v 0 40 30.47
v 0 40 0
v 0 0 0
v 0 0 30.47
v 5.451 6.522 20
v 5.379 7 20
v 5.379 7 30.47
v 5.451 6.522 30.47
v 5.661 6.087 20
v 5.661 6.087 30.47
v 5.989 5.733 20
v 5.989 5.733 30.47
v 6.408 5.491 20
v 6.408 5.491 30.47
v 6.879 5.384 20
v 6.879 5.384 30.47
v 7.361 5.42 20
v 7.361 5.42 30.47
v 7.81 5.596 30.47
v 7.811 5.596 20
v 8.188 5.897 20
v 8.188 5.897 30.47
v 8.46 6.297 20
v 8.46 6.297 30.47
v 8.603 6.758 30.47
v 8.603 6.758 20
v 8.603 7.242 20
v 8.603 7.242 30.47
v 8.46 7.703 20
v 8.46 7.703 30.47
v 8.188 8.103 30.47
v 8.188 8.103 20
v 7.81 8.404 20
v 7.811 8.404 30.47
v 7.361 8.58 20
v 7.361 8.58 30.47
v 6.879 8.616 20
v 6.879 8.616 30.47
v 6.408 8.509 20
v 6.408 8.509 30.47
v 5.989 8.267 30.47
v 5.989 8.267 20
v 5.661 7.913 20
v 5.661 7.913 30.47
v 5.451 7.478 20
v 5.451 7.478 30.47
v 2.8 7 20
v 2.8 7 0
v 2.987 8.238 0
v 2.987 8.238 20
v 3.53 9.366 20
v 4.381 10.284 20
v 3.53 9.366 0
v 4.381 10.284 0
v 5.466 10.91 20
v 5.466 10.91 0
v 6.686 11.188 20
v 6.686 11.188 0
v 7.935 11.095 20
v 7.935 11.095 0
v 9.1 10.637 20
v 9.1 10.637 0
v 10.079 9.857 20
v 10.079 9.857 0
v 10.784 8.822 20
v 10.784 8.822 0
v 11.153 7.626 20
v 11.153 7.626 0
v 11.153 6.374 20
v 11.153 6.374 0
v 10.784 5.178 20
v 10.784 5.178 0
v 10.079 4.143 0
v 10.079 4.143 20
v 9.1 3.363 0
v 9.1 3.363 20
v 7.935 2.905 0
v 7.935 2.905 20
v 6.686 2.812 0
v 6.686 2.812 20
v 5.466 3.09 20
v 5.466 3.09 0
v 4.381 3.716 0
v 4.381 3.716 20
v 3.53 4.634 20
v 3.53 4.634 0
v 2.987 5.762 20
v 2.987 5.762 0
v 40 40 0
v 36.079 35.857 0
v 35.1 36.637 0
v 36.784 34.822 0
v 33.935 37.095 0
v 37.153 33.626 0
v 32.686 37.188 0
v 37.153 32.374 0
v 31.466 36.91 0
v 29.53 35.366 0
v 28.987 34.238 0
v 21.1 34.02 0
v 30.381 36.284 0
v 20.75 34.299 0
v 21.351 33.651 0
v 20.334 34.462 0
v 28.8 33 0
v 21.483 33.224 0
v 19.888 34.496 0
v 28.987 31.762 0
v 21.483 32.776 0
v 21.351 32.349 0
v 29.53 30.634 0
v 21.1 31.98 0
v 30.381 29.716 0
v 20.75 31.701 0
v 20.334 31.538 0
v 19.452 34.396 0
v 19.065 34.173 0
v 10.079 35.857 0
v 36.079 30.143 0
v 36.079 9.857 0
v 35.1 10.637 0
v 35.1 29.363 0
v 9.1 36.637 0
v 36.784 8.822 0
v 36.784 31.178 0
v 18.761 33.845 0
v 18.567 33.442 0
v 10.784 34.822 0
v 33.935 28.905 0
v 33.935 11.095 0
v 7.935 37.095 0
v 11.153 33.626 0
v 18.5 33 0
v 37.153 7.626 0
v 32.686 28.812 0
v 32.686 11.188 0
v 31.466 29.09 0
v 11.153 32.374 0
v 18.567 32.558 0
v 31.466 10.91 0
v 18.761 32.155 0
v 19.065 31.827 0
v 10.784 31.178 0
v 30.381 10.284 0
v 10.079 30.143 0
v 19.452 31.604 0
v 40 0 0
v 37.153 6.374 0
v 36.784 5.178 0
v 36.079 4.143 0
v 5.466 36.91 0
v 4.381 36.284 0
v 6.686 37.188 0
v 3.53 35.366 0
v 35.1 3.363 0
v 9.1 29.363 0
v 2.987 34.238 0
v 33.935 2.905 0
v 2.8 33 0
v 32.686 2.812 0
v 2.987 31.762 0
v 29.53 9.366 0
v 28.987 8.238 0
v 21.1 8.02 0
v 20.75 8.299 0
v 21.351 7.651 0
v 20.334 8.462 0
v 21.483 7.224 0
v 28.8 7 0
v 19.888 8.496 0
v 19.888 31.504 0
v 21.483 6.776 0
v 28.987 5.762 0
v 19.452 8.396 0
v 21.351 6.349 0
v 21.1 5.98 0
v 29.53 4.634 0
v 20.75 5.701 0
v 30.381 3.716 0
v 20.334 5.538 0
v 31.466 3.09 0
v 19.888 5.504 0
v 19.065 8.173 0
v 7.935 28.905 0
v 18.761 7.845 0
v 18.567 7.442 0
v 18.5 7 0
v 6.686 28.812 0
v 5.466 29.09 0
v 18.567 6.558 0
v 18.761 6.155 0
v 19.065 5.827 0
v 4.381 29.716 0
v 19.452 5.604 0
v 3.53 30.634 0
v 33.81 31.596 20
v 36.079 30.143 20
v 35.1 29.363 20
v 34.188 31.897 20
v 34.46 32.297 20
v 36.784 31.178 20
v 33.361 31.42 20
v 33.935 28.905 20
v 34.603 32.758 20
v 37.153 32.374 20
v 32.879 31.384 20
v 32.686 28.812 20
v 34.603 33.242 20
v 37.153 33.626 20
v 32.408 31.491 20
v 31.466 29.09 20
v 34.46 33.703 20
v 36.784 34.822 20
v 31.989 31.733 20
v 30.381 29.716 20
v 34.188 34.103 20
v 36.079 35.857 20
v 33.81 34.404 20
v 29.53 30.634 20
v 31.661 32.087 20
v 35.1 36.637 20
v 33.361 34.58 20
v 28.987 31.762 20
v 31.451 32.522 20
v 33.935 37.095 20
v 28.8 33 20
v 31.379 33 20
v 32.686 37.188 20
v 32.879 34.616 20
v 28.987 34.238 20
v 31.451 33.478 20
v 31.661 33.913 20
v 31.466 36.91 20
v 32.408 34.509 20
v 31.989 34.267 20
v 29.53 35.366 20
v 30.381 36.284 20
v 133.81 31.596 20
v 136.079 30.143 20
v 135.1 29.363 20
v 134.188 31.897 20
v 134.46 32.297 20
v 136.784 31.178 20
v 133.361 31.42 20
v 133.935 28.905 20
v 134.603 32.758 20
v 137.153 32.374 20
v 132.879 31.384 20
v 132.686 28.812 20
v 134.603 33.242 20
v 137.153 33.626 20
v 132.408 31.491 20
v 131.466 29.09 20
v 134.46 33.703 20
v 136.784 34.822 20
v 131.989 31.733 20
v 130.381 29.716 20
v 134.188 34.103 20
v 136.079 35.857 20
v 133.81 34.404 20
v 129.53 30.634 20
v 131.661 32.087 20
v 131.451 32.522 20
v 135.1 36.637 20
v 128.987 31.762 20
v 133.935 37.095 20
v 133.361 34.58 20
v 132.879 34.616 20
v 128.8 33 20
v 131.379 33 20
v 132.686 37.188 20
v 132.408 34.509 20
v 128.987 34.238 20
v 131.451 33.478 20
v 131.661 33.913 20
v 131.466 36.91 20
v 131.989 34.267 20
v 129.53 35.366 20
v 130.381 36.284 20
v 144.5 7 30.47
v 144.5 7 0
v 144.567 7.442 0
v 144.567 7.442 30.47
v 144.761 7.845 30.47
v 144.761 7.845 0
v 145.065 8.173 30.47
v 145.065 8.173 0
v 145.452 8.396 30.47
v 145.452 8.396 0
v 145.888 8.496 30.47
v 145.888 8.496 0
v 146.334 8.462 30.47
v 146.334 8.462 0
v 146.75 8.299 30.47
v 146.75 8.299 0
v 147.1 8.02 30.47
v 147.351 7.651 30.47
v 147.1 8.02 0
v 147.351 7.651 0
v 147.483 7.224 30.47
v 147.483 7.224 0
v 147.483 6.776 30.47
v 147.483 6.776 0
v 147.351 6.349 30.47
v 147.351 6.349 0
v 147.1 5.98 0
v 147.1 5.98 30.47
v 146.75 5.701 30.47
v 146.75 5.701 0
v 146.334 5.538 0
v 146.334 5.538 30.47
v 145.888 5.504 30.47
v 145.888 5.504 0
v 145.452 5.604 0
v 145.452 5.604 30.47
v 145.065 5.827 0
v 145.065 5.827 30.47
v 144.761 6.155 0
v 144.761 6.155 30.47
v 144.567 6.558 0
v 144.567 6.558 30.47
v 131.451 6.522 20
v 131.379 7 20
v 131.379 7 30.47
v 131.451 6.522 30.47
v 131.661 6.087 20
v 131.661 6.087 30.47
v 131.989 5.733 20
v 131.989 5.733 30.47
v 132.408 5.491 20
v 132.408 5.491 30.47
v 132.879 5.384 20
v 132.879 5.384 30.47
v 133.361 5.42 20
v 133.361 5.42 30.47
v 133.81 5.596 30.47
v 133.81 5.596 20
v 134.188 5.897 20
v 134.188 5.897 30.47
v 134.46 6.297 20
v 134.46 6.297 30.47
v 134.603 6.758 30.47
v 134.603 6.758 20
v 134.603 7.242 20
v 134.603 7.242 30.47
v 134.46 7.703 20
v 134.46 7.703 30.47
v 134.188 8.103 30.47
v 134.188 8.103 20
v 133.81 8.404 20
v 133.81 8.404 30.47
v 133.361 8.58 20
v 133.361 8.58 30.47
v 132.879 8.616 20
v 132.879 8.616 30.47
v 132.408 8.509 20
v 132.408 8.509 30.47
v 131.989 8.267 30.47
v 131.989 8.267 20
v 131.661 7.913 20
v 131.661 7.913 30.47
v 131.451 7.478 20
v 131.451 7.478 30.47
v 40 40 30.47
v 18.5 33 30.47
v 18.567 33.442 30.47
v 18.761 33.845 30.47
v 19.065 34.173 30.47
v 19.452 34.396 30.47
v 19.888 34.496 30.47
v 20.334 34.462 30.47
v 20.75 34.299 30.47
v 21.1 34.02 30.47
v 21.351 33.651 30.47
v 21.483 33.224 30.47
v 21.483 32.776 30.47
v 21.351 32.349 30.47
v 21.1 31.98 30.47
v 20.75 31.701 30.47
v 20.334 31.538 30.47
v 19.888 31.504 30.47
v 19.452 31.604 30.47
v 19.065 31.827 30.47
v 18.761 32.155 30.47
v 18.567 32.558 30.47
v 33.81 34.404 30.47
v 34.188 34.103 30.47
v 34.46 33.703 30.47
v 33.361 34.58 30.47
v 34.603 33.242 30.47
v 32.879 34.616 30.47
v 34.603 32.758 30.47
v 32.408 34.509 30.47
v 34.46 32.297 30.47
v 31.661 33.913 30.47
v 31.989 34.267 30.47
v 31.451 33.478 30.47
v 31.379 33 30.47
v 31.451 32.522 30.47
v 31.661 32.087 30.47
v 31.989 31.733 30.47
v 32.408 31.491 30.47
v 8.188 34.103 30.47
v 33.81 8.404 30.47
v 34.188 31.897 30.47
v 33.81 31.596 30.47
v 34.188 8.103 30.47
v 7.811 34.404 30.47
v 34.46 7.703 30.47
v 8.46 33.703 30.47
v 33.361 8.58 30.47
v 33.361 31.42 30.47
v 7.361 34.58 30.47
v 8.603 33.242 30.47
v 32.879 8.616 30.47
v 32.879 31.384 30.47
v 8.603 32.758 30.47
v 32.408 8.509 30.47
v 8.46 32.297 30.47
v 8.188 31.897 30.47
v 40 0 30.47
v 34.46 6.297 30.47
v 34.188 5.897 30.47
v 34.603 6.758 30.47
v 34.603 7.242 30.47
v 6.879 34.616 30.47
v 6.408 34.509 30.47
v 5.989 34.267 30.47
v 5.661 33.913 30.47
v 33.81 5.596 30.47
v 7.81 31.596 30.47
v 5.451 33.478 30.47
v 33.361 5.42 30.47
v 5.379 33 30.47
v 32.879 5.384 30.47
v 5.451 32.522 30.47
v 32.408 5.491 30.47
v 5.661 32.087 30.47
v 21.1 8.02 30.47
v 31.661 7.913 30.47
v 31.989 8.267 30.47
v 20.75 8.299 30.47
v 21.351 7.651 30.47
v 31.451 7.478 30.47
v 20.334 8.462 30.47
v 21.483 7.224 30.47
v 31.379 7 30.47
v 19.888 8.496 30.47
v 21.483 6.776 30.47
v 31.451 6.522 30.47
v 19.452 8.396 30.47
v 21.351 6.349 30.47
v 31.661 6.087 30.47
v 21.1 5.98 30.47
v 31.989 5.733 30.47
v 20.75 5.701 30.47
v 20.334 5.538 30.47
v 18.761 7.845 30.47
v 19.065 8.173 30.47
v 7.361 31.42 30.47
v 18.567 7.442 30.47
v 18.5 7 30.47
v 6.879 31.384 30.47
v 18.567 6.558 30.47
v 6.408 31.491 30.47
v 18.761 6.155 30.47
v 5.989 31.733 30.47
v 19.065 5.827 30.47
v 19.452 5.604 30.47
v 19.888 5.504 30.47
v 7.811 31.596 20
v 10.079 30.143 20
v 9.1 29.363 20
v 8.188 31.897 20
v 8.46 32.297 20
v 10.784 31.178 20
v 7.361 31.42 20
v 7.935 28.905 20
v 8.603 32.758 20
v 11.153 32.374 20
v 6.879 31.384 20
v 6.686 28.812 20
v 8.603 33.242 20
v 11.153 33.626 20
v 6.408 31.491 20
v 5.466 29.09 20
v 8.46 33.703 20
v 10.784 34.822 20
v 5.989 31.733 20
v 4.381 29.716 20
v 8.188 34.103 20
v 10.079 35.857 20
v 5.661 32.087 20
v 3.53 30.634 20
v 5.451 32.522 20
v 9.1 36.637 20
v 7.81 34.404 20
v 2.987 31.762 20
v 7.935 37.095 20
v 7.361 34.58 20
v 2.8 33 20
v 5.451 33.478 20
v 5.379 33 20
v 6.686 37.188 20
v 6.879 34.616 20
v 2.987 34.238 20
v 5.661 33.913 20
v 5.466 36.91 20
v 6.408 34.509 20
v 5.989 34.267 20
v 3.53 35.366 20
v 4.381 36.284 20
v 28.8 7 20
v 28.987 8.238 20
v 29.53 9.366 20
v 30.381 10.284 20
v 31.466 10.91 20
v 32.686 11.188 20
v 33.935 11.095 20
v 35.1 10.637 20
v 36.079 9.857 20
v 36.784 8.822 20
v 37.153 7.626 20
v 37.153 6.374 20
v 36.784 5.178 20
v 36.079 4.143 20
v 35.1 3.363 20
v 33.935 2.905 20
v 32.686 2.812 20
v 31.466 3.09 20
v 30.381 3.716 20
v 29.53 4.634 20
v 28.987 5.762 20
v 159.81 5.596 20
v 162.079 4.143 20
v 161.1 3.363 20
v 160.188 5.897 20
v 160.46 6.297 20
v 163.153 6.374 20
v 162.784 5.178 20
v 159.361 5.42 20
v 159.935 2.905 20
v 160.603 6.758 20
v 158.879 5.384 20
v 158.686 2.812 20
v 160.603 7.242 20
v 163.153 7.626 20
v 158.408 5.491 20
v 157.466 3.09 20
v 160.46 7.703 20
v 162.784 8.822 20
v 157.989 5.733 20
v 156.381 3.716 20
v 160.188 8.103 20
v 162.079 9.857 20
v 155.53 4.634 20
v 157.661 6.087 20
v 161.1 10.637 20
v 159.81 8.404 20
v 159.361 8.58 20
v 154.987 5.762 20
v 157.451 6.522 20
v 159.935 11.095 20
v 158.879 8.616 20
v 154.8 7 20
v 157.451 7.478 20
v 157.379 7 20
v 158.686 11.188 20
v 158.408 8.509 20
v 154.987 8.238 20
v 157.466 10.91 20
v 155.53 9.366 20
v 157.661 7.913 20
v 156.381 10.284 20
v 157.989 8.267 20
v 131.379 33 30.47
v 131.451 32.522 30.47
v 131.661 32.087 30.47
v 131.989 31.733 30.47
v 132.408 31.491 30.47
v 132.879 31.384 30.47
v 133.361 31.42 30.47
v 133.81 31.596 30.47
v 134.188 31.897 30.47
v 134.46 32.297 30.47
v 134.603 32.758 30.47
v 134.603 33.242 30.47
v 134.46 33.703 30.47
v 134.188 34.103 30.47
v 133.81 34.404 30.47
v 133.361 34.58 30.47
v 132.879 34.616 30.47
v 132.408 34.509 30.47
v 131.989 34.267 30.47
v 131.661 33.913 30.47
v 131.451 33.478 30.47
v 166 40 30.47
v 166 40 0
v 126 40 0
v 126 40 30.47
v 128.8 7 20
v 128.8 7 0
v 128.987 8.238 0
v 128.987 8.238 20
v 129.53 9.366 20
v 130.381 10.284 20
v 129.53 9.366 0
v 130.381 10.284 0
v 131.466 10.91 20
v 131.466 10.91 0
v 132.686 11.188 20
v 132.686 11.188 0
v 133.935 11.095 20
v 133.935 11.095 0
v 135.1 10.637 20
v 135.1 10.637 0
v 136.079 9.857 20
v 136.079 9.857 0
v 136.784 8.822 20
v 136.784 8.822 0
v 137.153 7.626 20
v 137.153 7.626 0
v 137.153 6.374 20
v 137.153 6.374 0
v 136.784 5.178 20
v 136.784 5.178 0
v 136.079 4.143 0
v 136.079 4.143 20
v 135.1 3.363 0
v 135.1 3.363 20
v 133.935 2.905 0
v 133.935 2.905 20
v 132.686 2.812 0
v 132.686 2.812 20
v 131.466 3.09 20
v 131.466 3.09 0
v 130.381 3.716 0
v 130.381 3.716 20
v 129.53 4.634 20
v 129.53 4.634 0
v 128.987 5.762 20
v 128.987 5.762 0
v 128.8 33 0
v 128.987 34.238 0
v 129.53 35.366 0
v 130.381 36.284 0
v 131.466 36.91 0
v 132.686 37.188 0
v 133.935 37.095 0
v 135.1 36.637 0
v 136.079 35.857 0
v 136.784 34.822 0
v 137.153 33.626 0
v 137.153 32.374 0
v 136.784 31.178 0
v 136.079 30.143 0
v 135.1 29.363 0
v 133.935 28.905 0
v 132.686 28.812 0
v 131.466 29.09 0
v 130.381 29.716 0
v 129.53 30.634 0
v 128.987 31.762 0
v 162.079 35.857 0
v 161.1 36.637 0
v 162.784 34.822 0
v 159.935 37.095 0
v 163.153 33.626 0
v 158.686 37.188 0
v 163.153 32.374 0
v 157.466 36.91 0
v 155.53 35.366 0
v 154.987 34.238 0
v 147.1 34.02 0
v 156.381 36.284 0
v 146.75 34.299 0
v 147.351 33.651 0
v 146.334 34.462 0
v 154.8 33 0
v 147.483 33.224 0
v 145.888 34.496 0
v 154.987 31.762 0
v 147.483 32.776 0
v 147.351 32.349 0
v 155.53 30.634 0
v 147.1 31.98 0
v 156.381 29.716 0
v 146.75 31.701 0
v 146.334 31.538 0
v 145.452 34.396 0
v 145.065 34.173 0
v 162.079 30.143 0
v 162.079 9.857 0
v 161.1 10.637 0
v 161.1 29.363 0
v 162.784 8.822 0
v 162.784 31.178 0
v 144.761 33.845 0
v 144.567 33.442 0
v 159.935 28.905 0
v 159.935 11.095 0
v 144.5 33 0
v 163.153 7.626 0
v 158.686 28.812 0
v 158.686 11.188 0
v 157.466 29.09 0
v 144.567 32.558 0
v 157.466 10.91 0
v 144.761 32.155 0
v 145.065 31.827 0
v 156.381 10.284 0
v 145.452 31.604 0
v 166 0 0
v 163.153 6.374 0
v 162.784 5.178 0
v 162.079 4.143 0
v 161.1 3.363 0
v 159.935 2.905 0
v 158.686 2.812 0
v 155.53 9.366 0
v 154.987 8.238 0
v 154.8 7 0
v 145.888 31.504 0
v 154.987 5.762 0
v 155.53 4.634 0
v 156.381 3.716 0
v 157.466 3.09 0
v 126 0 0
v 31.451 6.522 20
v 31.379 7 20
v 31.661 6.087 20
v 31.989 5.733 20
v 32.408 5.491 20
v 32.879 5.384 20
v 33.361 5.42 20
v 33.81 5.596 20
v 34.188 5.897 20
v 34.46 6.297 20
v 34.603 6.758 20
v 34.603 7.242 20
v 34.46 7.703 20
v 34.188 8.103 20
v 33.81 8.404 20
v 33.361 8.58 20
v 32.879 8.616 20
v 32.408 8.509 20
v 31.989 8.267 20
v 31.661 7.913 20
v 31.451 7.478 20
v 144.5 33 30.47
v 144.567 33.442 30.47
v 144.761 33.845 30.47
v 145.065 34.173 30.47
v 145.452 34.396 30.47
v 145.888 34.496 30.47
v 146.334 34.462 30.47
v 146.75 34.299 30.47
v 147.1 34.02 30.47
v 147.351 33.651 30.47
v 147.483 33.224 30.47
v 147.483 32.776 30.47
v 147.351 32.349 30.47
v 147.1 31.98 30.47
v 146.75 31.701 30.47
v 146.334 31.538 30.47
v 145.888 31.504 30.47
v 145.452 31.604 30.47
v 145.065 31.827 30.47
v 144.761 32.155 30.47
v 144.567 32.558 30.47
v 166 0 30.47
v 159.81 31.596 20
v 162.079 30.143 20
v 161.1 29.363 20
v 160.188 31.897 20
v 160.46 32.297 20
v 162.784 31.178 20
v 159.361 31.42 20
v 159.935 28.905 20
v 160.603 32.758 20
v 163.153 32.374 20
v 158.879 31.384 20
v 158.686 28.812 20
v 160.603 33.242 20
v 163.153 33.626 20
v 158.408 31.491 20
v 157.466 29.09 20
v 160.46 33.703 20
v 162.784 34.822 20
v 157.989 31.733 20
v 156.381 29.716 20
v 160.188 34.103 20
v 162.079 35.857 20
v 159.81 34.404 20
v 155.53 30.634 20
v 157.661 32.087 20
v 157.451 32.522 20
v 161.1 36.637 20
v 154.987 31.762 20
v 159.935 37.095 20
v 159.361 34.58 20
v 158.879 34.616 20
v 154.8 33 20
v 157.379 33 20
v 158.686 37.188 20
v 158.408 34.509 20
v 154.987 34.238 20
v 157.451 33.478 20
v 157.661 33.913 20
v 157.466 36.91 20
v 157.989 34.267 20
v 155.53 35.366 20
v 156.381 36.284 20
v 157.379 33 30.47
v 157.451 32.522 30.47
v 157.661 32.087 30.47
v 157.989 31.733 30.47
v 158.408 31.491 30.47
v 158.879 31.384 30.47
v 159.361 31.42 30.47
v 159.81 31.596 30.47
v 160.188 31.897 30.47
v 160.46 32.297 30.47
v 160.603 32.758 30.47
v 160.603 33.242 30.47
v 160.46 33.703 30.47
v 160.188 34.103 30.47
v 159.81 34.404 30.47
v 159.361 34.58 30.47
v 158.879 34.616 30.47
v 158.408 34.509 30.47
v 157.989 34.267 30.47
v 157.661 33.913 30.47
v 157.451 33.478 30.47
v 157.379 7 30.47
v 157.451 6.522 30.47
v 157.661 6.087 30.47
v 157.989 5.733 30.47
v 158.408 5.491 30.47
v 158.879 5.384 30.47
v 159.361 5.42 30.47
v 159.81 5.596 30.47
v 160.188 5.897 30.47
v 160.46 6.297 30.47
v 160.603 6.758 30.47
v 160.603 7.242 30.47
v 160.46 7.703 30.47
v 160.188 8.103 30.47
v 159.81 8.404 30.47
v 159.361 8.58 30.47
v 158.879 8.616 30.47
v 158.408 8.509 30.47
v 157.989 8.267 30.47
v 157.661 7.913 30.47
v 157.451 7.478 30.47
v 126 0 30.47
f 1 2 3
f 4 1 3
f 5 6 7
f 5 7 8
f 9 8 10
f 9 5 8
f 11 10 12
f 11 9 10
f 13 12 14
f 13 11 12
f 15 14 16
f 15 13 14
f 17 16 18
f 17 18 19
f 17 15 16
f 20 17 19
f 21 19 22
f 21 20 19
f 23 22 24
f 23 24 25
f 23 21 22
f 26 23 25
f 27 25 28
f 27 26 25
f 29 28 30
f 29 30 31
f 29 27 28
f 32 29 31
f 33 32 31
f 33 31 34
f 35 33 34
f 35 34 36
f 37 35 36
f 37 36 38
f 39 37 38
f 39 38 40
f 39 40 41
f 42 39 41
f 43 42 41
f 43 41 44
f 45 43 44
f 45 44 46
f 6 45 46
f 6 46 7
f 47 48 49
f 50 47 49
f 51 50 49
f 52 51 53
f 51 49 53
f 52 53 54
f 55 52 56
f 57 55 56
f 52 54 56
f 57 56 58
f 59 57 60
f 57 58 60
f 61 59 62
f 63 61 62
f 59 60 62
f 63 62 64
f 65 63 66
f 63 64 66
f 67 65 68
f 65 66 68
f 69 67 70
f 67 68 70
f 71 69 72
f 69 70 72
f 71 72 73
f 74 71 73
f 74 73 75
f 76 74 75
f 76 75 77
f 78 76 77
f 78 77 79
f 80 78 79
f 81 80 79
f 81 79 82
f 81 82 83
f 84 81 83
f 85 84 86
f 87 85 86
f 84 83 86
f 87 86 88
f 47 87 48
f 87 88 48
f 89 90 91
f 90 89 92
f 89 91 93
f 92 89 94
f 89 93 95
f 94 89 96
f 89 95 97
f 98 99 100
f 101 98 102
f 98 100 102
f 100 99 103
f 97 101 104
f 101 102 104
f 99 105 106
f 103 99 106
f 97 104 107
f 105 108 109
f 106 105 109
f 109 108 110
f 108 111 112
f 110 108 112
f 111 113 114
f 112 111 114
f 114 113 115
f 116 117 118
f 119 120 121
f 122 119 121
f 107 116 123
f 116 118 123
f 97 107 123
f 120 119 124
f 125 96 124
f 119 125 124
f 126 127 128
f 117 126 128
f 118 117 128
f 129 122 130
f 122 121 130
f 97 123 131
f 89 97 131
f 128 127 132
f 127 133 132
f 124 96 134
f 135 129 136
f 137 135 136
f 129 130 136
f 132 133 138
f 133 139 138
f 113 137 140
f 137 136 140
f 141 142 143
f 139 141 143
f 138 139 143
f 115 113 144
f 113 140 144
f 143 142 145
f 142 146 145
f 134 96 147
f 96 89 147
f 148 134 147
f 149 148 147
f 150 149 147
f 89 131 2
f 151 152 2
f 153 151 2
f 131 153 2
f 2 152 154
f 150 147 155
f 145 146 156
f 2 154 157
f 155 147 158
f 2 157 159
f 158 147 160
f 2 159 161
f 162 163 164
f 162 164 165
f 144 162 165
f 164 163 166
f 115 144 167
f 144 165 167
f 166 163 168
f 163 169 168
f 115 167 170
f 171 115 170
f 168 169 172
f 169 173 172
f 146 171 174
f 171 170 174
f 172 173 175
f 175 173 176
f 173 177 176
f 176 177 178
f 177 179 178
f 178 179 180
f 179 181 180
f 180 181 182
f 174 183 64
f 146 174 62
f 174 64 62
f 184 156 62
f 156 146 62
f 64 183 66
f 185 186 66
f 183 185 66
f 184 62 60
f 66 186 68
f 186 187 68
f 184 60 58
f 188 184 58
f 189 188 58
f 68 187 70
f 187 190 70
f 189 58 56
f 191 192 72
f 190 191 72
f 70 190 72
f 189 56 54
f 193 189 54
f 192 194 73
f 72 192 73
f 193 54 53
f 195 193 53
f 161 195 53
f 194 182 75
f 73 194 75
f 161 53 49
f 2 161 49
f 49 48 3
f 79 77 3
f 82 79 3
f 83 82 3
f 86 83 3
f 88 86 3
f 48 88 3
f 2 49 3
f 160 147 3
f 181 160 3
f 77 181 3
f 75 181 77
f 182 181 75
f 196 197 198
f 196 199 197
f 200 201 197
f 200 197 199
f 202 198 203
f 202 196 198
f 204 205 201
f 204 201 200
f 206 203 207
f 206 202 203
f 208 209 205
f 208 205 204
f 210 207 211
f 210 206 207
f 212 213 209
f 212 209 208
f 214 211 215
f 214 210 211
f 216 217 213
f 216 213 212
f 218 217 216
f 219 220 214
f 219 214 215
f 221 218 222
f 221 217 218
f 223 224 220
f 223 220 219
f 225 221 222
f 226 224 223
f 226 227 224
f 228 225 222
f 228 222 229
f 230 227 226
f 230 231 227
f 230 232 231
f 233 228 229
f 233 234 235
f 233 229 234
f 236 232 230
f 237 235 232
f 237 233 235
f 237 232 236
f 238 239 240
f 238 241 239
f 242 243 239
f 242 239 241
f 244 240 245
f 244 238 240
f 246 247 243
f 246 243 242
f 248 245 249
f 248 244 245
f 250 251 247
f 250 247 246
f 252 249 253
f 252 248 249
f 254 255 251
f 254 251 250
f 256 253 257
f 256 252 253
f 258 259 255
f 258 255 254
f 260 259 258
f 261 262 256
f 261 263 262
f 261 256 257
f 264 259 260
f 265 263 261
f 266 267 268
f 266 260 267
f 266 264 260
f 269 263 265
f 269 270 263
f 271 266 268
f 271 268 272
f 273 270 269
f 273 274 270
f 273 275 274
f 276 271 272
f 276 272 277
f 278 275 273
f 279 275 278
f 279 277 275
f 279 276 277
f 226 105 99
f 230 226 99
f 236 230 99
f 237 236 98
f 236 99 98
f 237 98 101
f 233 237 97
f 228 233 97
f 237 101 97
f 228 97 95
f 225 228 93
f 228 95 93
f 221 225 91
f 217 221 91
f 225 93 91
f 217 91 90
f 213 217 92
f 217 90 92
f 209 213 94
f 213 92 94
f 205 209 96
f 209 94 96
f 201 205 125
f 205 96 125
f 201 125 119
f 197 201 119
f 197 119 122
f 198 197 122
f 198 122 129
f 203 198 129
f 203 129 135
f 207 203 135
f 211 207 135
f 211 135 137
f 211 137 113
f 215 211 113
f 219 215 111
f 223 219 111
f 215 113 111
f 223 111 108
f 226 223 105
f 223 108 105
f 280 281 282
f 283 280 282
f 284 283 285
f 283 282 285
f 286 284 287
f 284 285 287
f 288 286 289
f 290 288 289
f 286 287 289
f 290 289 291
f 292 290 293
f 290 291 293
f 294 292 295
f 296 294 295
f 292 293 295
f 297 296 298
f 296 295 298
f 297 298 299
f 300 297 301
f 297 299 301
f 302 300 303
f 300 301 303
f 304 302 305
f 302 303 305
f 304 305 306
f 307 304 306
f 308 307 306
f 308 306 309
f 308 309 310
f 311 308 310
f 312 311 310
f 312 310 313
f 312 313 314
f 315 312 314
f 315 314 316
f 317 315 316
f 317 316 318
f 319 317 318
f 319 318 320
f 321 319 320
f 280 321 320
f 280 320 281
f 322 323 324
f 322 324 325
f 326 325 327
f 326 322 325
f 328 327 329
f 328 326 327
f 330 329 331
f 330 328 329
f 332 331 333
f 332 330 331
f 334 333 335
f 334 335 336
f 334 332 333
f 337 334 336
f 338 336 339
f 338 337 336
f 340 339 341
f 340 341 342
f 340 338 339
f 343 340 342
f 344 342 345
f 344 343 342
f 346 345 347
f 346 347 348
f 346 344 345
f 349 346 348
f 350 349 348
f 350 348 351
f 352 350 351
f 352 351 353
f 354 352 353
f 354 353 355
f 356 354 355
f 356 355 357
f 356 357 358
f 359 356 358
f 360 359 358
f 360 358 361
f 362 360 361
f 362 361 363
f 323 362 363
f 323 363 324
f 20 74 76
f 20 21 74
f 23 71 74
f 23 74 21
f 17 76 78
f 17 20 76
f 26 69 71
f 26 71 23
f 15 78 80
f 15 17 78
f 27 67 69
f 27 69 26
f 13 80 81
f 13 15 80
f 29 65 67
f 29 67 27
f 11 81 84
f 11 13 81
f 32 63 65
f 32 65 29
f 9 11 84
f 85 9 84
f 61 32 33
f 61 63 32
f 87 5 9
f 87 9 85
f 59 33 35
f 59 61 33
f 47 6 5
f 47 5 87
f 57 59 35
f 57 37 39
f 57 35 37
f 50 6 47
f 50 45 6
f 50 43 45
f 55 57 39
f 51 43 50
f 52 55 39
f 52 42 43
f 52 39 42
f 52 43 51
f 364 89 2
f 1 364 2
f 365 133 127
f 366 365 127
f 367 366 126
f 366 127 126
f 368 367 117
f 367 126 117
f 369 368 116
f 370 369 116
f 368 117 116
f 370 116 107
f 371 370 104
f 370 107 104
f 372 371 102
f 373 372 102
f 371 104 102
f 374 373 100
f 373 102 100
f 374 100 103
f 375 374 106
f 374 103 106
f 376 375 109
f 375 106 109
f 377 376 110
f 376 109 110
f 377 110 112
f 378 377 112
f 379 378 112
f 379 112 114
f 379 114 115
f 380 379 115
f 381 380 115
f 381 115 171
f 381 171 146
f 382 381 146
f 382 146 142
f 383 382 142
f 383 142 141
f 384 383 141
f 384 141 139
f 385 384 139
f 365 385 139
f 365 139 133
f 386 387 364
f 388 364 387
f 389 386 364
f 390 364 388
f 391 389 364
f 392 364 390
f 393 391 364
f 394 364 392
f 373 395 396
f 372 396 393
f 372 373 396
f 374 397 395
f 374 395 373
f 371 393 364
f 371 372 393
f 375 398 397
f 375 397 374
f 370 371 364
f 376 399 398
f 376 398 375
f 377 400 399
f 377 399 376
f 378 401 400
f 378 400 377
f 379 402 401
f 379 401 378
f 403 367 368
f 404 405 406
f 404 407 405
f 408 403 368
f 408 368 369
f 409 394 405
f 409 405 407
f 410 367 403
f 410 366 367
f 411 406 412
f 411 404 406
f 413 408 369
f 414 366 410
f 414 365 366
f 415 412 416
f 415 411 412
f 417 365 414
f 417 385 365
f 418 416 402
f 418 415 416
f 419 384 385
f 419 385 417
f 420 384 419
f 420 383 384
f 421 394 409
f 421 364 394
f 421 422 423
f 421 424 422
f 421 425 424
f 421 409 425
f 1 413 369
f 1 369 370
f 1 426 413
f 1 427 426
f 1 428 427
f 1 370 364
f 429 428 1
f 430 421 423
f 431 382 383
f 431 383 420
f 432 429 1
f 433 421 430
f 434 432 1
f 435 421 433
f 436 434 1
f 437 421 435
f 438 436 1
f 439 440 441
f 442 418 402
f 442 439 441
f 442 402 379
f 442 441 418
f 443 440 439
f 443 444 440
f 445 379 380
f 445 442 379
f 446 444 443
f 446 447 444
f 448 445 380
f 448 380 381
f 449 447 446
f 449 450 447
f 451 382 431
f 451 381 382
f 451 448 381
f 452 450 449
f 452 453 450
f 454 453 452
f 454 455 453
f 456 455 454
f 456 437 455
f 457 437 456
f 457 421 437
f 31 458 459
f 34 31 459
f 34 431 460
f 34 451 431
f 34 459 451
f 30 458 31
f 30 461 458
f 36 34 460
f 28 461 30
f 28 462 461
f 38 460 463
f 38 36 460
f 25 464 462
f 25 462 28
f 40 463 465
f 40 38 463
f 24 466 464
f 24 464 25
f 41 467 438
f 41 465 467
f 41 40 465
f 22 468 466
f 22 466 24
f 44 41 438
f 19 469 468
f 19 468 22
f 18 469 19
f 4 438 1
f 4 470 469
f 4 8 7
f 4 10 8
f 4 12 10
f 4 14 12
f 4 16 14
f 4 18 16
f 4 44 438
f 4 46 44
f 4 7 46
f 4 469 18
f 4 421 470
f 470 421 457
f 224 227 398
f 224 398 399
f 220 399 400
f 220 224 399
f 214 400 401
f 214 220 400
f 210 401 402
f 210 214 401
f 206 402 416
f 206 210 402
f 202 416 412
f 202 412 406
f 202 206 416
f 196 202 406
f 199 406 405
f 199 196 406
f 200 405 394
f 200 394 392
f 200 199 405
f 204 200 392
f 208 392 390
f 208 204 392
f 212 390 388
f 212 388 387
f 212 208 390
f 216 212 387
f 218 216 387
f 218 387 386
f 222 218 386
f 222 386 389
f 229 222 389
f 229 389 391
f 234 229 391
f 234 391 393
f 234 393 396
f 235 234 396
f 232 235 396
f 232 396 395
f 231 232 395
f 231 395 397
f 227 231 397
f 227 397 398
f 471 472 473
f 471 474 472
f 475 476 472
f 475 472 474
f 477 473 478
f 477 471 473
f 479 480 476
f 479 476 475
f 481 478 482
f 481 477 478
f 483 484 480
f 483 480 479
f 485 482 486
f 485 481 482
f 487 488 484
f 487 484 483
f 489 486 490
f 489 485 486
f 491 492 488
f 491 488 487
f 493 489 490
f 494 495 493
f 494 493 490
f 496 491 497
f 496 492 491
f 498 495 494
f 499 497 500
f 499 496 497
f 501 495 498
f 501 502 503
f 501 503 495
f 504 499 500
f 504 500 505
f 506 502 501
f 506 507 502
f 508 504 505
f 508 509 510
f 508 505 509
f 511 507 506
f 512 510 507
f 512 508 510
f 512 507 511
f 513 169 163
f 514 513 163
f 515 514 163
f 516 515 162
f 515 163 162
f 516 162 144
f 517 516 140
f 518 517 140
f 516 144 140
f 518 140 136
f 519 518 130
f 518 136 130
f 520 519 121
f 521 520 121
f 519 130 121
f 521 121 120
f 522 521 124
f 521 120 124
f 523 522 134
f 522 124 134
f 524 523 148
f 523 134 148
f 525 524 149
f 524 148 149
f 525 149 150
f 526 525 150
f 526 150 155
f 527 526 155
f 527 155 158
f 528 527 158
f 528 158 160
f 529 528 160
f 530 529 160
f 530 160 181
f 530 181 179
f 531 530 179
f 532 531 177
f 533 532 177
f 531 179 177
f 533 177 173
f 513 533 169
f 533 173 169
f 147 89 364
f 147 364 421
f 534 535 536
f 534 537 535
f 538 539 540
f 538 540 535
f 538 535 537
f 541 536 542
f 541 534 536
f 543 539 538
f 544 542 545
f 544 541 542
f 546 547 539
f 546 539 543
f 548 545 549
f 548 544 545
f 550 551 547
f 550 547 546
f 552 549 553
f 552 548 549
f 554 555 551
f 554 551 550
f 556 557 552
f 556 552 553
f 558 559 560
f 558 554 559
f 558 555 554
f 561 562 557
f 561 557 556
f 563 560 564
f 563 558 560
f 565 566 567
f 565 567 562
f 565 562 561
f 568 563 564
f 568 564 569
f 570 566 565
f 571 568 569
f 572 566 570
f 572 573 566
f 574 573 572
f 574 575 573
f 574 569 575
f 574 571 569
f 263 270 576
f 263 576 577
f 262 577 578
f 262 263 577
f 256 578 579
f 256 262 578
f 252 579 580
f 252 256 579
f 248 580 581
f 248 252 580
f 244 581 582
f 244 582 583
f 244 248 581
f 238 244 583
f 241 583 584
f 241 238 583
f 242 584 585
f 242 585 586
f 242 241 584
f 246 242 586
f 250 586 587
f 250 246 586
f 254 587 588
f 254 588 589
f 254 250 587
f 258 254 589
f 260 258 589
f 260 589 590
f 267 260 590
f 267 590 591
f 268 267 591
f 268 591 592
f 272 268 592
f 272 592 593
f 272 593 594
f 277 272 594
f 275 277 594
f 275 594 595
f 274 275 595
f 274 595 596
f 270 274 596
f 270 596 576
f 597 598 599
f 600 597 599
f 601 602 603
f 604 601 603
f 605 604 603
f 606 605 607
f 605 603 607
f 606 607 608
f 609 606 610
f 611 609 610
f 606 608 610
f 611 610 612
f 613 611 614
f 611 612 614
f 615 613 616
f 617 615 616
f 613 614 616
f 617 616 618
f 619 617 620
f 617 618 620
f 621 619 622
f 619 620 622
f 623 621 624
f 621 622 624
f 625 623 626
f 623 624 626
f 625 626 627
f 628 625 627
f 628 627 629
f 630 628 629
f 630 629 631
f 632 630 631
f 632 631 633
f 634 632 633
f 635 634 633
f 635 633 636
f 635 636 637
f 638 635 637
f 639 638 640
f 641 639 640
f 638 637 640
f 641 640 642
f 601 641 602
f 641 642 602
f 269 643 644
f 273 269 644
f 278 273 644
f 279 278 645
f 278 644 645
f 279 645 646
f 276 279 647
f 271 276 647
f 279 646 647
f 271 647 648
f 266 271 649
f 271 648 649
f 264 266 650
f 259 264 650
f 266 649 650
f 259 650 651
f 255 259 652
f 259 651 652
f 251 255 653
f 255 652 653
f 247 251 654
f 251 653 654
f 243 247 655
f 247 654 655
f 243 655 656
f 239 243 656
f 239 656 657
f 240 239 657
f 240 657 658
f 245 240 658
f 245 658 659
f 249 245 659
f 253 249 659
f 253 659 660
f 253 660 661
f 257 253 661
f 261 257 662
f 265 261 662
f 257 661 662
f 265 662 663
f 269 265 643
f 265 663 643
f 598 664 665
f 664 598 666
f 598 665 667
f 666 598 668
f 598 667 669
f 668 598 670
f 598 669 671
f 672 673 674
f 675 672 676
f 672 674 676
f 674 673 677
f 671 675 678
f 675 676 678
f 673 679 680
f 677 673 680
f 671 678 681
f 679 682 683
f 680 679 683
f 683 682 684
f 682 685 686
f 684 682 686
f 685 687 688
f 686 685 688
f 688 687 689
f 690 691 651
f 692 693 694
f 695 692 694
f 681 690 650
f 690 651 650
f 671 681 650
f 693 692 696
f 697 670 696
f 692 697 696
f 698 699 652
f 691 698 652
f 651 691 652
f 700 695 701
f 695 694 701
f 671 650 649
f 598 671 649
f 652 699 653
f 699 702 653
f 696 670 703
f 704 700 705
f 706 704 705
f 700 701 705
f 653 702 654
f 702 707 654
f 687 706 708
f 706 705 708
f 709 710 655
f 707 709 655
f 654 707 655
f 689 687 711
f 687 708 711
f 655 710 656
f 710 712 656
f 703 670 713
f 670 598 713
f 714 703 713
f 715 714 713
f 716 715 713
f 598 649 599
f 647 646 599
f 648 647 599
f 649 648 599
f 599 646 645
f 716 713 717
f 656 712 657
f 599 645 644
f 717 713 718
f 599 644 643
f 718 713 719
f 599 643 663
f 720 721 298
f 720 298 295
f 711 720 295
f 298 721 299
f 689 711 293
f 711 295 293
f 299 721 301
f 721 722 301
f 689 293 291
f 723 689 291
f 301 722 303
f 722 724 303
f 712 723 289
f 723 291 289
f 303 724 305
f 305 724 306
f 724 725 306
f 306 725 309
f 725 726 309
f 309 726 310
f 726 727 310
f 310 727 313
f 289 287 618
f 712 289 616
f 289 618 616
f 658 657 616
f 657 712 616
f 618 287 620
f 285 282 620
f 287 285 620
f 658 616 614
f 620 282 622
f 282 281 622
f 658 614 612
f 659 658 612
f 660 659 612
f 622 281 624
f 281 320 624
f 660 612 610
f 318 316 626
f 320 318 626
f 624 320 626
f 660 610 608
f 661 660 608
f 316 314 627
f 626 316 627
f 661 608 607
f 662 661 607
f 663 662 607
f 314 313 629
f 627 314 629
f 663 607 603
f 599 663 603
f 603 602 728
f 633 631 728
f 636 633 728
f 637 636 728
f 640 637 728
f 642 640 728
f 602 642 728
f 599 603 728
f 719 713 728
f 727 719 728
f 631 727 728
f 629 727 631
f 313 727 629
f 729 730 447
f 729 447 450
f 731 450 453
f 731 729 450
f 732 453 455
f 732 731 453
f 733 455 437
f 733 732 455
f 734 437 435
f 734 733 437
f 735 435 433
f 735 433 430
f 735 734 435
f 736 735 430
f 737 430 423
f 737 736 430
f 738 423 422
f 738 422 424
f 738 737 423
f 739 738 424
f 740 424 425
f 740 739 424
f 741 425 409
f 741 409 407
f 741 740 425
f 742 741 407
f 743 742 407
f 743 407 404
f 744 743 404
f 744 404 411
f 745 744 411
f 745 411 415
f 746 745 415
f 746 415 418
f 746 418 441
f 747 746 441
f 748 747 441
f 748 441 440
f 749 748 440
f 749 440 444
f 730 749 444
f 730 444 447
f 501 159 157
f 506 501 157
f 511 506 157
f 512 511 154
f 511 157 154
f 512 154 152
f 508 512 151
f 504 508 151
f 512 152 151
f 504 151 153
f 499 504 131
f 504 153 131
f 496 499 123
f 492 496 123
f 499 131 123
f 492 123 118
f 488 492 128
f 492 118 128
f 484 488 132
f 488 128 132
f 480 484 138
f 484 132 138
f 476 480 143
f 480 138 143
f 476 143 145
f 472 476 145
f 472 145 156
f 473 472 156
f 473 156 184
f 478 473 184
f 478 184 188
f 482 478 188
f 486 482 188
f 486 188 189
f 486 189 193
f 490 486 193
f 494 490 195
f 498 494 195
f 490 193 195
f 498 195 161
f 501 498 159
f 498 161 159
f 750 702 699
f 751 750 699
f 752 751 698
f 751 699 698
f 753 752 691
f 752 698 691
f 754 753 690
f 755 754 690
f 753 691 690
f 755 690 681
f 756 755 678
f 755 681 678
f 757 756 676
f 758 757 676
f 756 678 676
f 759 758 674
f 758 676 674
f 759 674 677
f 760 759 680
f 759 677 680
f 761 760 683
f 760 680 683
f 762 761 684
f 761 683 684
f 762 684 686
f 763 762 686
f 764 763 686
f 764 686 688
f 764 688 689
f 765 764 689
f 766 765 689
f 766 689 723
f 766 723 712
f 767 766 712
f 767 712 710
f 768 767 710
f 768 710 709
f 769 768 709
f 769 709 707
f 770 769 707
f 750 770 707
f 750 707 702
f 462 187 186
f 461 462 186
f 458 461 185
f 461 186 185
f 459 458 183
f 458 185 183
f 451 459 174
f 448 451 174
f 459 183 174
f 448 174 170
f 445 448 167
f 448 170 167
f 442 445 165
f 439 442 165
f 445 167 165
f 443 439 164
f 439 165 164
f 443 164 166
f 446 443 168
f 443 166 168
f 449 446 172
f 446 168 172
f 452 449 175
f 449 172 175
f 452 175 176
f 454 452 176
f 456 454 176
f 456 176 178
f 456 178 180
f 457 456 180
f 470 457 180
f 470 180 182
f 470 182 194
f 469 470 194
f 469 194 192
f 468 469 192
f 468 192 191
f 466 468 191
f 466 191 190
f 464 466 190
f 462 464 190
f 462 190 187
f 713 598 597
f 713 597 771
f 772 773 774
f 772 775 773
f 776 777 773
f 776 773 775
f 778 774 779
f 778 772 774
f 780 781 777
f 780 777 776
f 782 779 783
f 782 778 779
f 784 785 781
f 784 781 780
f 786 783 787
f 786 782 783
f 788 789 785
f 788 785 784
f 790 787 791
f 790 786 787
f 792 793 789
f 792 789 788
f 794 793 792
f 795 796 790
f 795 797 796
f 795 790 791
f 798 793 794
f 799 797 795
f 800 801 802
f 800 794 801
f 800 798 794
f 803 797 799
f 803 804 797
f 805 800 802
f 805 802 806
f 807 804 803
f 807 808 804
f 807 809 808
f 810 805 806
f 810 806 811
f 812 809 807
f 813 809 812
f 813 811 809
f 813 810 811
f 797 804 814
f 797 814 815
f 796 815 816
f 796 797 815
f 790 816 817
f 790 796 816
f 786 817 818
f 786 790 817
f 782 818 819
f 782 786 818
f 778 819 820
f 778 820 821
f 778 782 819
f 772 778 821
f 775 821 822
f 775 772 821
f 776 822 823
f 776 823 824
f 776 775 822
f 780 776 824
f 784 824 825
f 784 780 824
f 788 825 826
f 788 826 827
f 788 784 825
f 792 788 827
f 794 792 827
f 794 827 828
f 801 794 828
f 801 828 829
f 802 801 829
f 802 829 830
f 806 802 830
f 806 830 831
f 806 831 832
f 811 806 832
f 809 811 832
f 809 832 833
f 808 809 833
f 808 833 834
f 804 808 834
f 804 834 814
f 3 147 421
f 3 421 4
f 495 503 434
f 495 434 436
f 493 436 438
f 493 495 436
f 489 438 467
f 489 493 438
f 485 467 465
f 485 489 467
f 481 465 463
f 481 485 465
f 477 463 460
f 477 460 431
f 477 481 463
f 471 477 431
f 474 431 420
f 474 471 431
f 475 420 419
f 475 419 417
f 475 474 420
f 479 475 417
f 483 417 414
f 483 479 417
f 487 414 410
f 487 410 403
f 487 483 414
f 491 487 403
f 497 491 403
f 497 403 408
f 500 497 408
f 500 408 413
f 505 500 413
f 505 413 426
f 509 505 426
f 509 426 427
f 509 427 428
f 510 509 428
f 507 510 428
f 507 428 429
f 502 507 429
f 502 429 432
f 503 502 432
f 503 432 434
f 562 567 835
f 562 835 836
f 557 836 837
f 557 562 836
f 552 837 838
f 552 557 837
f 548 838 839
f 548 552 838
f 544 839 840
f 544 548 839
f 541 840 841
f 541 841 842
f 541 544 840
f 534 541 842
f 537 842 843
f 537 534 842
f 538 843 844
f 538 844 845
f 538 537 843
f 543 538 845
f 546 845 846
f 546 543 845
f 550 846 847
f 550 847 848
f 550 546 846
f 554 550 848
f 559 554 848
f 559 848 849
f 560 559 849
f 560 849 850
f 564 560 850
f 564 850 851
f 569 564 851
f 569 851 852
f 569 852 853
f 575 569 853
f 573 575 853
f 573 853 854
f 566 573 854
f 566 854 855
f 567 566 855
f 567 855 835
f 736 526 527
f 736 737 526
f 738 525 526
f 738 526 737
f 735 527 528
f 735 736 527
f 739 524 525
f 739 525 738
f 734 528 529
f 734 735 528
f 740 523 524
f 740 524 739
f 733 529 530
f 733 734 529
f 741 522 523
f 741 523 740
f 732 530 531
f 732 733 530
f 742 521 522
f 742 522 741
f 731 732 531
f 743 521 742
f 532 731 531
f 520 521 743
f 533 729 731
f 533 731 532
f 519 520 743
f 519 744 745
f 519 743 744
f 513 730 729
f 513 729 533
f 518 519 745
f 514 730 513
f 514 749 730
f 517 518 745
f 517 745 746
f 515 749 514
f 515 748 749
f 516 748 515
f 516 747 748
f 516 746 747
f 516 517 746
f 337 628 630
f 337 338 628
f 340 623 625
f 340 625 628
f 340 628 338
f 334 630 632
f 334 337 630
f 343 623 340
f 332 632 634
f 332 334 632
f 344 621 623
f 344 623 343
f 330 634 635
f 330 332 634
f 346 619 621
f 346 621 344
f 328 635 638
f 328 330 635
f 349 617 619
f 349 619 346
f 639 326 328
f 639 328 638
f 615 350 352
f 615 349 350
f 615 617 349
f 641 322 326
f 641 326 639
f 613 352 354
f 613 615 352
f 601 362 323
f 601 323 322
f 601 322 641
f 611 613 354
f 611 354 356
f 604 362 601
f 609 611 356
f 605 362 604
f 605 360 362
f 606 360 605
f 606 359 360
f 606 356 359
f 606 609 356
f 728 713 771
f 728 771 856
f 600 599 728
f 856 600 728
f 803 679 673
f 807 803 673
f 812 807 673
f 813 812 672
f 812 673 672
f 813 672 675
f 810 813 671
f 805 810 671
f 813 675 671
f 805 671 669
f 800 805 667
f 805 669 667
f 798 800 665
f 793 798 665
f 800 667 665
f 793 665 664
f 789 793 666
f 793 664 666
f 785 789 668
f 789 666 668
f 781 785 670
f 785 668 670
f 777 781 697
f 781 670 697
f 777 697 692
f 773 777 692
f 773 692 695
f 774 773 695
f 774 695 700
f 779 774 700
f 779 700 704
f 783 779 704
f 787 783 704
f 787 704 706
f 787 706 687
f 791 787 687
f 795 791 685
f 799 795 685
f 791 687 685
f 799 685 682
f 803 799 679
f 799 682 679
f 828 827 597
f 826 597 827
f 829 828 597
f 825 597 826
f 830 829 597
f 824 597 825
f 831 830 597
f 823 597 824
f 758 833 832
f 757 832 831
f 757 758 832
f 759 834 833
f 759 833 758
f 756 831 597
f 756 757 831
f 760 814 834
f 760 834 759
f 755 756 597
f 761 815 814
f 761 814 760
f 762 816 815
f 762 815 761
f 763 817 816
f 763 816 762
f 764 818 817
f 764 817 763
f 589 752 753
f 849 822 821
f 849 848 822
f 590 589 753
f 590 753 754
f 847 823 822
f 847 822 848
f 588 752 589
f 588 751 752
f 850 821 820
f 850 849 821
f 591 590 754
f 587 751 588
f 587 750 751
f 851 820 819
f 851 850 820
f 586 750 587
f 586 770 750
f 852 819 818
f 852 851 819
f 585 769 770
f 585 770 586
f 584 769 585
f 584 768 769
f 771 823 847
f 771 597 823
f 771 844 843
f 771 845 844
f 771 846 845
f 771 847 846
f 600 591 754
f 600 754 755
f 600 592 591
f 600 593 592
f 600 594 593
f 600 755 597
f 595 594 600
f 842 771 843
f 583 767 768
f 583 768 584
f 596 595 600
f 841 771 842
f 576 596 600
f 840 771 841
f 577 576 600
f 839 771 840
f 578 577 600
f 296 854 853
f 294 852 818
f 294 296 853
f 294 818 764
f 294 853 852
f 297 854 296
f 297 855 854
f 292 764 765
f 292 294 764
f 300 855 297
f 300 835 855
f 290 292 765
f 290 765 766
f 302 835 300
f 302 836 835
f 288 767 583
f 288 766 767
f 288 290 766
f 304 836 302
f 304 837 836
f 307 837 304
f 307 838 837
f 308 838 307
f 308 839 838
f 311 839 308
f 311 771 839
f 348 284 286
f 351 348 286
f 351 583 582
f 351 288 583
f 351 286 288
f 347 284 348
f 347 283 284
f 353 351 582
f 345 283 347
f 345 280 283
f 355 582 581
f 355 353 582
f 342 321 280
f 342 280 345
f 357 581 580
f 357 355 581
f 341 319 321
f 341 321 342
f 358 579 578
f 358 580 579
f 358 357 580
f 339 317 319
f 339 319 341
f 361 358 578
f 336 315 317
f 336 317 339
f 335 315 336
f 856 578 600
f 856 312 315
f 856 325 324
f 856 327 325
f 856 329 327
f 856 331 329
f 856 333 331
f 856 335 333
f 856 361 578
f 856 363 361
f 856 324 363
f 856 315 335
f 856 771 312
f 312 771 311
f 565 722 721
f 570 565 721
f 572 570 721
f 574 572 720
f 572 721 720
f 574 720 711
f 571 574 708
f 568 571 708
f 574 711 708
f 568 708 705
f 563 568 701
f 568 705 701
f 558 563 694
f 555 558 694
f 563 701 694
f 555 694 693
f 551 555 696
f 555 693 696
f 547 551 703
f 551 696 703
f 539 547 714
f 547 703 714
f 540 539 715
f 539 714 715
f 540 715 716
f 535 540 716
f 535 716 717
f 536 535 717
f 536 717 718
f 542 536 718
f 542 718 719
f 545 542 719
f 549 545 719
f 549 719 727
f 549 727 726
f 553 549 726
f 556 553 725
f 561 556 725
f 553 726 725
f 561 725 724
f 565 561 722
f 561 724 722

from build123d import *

# Parameters (mm, degrees)
SKETCH1_W             = 40
SKETCH1_H             = 40
SKETCH1_R             = 1.621
BOSS_EXTRUDE1_DEPTH   = 30.47
BOSS_EXTRUDE1_2_DEPTH = 30.47
SKETCH4_R             = 4.2
CUT_EXTRUDE1_DEPTH    = 20
SKETCH5_R             = 1.5
CUT_EXTRUDE2_DEPTH    = 174.448611698


with BuildPart() as part:
    # Sketch1 → Boss-Extrude1 (new body)
    with BuildSketch(Plane(origin=(0, 0, 0), x_dir=(-1, 0, 0), z_dir=(0, 0, 1))):
        with Locations((-20, -20)):
            Rectangle(SKETCH1_W, SKETCH1_H)
        with Locations((-33, -7)):
            Circle(SKETCH1_R, mode=Mode.SUBTRACT)
        with Locations((-7, -7)):
            Circle(SKETCH1_R, mode=Mode.SUBTRACT)
        with Locations((-7, -33)):
            Circle(SKETCH1_R, mode=Mode.SUBTRACT)
        with Locations((-33, -33)):
            Circle(SKETCH1_R, mode=Mode.SUBTRACT)
    extrude(amount=BOSS_EXTRUDE1_DEPTH)


with BuildPart() as body_2:
    # Sketch1 → Boss-Extrude1 2 (new body)
    with BuildSketch(Plane(origin=(0, 0, 0), x_dir=(-1, 0, 0), z_dir=(0, 0, 1))):
        with Locations((-146, -20)):
            Rectangle(SKETCH1_W, SKETCH1_H)
        with Locations((-159, -7)):
            Circle(SKETCH1_R, mode=Mode.SUBTRACT)
        with Locations((-133, -7)):
            Circle(SKETCH1_R, mode=Mode.SUBTRACT)
        with Locations((-133, -33)):
            Circle(SKETCH1_R, mode=Mode.SUBTRACT)
        with Locations((-159, -33)):
            Circle(SKETCH1_R, mode=Mode.SUBTRACT)
    extrude(amount=BOSS_EXTRUDE1_2_DEPTH)


with BuildPart() as cut_extrude1_tool:
    # Sketch4 → Cut-Extrude1 (new body)
    with BuildSketch(Plane(origin=(0, 0, 0), x_dir=(-1, 0, 0), z_dir=(0, 0, -1))):
        with Locations((-7, 7)):
            Circle(SKETCH4_R)
        with Locations((-33, 7)):
            Circle(SKETCH4_R)
        with Locations((-7, 33)):
            Circle(SKETCH4_R)
        with Locations((-33, 33)):
            Circle(SKETCH4_R)
        with Locations((-133, 7)):
            Circle(SKETCH4_R)
        with Locations((-133, 33)):
            Circle(SKETCH4_R)
        with Locations((-159, 33)):
            Circle(SKETCH4_R)
        with Locations((-159, 7)):
            Circle(SKETCH4_R)
    extrude(amount=-CUT_EXTRUDE1_DEPTH)


with BuildPart() as part_1:
    add(part.part)

    # Cut-Extrude1: cut by cut_extrude1_tool
    add(cut_extrude1_tool.part, mode=Mode.SUBTRACT)


with BuildPart() as body_2_1:
    add(body_2.part)

    # Cut-Extrude1: cut by cut_extrude1_tool
    add(cut_extrude1_tool.part, mode=Mode.SUBTRACT)


with BuildPart() as cut_extrude2_tool:
    # Sketch5 → Cut-Extrude2 (new, through all)
    with BuildSketch(Plane(origin=(0, 0, 0), x_dir=(-1, 0, 0), z_dir=(0, 0, -1))):
        with Locations((-20, 7)):
            Circle(SKETCH5_R)
        with Locations((-20, 33)):
            Circle(SKETCH5_R)
        with Locations((-146, 7)):
            Circle(SKETCH5_R)
        with Locations((-146, 33)):
            Circle(SKETCH5_R)
    extrude(amount=-CUT_EXTRUDE2_DEPTH)


with BuildPart() as part_2:
    add(part_1.part)

    # Cut-Extrude2: cut by cut_extrude2_tool
    add(cut_extrude2_tool.part, mode=Mode.SUBTRACT)


with BuildPart() as body_2_2:
    add(body_2_1.part)

    # Cut-Extrude2: cut by cut_extrude2_tool
    add(cut_extrude2_tool.part, mode=Mode.SUBTRACT)


solid = Compound([part_2.part, body_2_2.part])
